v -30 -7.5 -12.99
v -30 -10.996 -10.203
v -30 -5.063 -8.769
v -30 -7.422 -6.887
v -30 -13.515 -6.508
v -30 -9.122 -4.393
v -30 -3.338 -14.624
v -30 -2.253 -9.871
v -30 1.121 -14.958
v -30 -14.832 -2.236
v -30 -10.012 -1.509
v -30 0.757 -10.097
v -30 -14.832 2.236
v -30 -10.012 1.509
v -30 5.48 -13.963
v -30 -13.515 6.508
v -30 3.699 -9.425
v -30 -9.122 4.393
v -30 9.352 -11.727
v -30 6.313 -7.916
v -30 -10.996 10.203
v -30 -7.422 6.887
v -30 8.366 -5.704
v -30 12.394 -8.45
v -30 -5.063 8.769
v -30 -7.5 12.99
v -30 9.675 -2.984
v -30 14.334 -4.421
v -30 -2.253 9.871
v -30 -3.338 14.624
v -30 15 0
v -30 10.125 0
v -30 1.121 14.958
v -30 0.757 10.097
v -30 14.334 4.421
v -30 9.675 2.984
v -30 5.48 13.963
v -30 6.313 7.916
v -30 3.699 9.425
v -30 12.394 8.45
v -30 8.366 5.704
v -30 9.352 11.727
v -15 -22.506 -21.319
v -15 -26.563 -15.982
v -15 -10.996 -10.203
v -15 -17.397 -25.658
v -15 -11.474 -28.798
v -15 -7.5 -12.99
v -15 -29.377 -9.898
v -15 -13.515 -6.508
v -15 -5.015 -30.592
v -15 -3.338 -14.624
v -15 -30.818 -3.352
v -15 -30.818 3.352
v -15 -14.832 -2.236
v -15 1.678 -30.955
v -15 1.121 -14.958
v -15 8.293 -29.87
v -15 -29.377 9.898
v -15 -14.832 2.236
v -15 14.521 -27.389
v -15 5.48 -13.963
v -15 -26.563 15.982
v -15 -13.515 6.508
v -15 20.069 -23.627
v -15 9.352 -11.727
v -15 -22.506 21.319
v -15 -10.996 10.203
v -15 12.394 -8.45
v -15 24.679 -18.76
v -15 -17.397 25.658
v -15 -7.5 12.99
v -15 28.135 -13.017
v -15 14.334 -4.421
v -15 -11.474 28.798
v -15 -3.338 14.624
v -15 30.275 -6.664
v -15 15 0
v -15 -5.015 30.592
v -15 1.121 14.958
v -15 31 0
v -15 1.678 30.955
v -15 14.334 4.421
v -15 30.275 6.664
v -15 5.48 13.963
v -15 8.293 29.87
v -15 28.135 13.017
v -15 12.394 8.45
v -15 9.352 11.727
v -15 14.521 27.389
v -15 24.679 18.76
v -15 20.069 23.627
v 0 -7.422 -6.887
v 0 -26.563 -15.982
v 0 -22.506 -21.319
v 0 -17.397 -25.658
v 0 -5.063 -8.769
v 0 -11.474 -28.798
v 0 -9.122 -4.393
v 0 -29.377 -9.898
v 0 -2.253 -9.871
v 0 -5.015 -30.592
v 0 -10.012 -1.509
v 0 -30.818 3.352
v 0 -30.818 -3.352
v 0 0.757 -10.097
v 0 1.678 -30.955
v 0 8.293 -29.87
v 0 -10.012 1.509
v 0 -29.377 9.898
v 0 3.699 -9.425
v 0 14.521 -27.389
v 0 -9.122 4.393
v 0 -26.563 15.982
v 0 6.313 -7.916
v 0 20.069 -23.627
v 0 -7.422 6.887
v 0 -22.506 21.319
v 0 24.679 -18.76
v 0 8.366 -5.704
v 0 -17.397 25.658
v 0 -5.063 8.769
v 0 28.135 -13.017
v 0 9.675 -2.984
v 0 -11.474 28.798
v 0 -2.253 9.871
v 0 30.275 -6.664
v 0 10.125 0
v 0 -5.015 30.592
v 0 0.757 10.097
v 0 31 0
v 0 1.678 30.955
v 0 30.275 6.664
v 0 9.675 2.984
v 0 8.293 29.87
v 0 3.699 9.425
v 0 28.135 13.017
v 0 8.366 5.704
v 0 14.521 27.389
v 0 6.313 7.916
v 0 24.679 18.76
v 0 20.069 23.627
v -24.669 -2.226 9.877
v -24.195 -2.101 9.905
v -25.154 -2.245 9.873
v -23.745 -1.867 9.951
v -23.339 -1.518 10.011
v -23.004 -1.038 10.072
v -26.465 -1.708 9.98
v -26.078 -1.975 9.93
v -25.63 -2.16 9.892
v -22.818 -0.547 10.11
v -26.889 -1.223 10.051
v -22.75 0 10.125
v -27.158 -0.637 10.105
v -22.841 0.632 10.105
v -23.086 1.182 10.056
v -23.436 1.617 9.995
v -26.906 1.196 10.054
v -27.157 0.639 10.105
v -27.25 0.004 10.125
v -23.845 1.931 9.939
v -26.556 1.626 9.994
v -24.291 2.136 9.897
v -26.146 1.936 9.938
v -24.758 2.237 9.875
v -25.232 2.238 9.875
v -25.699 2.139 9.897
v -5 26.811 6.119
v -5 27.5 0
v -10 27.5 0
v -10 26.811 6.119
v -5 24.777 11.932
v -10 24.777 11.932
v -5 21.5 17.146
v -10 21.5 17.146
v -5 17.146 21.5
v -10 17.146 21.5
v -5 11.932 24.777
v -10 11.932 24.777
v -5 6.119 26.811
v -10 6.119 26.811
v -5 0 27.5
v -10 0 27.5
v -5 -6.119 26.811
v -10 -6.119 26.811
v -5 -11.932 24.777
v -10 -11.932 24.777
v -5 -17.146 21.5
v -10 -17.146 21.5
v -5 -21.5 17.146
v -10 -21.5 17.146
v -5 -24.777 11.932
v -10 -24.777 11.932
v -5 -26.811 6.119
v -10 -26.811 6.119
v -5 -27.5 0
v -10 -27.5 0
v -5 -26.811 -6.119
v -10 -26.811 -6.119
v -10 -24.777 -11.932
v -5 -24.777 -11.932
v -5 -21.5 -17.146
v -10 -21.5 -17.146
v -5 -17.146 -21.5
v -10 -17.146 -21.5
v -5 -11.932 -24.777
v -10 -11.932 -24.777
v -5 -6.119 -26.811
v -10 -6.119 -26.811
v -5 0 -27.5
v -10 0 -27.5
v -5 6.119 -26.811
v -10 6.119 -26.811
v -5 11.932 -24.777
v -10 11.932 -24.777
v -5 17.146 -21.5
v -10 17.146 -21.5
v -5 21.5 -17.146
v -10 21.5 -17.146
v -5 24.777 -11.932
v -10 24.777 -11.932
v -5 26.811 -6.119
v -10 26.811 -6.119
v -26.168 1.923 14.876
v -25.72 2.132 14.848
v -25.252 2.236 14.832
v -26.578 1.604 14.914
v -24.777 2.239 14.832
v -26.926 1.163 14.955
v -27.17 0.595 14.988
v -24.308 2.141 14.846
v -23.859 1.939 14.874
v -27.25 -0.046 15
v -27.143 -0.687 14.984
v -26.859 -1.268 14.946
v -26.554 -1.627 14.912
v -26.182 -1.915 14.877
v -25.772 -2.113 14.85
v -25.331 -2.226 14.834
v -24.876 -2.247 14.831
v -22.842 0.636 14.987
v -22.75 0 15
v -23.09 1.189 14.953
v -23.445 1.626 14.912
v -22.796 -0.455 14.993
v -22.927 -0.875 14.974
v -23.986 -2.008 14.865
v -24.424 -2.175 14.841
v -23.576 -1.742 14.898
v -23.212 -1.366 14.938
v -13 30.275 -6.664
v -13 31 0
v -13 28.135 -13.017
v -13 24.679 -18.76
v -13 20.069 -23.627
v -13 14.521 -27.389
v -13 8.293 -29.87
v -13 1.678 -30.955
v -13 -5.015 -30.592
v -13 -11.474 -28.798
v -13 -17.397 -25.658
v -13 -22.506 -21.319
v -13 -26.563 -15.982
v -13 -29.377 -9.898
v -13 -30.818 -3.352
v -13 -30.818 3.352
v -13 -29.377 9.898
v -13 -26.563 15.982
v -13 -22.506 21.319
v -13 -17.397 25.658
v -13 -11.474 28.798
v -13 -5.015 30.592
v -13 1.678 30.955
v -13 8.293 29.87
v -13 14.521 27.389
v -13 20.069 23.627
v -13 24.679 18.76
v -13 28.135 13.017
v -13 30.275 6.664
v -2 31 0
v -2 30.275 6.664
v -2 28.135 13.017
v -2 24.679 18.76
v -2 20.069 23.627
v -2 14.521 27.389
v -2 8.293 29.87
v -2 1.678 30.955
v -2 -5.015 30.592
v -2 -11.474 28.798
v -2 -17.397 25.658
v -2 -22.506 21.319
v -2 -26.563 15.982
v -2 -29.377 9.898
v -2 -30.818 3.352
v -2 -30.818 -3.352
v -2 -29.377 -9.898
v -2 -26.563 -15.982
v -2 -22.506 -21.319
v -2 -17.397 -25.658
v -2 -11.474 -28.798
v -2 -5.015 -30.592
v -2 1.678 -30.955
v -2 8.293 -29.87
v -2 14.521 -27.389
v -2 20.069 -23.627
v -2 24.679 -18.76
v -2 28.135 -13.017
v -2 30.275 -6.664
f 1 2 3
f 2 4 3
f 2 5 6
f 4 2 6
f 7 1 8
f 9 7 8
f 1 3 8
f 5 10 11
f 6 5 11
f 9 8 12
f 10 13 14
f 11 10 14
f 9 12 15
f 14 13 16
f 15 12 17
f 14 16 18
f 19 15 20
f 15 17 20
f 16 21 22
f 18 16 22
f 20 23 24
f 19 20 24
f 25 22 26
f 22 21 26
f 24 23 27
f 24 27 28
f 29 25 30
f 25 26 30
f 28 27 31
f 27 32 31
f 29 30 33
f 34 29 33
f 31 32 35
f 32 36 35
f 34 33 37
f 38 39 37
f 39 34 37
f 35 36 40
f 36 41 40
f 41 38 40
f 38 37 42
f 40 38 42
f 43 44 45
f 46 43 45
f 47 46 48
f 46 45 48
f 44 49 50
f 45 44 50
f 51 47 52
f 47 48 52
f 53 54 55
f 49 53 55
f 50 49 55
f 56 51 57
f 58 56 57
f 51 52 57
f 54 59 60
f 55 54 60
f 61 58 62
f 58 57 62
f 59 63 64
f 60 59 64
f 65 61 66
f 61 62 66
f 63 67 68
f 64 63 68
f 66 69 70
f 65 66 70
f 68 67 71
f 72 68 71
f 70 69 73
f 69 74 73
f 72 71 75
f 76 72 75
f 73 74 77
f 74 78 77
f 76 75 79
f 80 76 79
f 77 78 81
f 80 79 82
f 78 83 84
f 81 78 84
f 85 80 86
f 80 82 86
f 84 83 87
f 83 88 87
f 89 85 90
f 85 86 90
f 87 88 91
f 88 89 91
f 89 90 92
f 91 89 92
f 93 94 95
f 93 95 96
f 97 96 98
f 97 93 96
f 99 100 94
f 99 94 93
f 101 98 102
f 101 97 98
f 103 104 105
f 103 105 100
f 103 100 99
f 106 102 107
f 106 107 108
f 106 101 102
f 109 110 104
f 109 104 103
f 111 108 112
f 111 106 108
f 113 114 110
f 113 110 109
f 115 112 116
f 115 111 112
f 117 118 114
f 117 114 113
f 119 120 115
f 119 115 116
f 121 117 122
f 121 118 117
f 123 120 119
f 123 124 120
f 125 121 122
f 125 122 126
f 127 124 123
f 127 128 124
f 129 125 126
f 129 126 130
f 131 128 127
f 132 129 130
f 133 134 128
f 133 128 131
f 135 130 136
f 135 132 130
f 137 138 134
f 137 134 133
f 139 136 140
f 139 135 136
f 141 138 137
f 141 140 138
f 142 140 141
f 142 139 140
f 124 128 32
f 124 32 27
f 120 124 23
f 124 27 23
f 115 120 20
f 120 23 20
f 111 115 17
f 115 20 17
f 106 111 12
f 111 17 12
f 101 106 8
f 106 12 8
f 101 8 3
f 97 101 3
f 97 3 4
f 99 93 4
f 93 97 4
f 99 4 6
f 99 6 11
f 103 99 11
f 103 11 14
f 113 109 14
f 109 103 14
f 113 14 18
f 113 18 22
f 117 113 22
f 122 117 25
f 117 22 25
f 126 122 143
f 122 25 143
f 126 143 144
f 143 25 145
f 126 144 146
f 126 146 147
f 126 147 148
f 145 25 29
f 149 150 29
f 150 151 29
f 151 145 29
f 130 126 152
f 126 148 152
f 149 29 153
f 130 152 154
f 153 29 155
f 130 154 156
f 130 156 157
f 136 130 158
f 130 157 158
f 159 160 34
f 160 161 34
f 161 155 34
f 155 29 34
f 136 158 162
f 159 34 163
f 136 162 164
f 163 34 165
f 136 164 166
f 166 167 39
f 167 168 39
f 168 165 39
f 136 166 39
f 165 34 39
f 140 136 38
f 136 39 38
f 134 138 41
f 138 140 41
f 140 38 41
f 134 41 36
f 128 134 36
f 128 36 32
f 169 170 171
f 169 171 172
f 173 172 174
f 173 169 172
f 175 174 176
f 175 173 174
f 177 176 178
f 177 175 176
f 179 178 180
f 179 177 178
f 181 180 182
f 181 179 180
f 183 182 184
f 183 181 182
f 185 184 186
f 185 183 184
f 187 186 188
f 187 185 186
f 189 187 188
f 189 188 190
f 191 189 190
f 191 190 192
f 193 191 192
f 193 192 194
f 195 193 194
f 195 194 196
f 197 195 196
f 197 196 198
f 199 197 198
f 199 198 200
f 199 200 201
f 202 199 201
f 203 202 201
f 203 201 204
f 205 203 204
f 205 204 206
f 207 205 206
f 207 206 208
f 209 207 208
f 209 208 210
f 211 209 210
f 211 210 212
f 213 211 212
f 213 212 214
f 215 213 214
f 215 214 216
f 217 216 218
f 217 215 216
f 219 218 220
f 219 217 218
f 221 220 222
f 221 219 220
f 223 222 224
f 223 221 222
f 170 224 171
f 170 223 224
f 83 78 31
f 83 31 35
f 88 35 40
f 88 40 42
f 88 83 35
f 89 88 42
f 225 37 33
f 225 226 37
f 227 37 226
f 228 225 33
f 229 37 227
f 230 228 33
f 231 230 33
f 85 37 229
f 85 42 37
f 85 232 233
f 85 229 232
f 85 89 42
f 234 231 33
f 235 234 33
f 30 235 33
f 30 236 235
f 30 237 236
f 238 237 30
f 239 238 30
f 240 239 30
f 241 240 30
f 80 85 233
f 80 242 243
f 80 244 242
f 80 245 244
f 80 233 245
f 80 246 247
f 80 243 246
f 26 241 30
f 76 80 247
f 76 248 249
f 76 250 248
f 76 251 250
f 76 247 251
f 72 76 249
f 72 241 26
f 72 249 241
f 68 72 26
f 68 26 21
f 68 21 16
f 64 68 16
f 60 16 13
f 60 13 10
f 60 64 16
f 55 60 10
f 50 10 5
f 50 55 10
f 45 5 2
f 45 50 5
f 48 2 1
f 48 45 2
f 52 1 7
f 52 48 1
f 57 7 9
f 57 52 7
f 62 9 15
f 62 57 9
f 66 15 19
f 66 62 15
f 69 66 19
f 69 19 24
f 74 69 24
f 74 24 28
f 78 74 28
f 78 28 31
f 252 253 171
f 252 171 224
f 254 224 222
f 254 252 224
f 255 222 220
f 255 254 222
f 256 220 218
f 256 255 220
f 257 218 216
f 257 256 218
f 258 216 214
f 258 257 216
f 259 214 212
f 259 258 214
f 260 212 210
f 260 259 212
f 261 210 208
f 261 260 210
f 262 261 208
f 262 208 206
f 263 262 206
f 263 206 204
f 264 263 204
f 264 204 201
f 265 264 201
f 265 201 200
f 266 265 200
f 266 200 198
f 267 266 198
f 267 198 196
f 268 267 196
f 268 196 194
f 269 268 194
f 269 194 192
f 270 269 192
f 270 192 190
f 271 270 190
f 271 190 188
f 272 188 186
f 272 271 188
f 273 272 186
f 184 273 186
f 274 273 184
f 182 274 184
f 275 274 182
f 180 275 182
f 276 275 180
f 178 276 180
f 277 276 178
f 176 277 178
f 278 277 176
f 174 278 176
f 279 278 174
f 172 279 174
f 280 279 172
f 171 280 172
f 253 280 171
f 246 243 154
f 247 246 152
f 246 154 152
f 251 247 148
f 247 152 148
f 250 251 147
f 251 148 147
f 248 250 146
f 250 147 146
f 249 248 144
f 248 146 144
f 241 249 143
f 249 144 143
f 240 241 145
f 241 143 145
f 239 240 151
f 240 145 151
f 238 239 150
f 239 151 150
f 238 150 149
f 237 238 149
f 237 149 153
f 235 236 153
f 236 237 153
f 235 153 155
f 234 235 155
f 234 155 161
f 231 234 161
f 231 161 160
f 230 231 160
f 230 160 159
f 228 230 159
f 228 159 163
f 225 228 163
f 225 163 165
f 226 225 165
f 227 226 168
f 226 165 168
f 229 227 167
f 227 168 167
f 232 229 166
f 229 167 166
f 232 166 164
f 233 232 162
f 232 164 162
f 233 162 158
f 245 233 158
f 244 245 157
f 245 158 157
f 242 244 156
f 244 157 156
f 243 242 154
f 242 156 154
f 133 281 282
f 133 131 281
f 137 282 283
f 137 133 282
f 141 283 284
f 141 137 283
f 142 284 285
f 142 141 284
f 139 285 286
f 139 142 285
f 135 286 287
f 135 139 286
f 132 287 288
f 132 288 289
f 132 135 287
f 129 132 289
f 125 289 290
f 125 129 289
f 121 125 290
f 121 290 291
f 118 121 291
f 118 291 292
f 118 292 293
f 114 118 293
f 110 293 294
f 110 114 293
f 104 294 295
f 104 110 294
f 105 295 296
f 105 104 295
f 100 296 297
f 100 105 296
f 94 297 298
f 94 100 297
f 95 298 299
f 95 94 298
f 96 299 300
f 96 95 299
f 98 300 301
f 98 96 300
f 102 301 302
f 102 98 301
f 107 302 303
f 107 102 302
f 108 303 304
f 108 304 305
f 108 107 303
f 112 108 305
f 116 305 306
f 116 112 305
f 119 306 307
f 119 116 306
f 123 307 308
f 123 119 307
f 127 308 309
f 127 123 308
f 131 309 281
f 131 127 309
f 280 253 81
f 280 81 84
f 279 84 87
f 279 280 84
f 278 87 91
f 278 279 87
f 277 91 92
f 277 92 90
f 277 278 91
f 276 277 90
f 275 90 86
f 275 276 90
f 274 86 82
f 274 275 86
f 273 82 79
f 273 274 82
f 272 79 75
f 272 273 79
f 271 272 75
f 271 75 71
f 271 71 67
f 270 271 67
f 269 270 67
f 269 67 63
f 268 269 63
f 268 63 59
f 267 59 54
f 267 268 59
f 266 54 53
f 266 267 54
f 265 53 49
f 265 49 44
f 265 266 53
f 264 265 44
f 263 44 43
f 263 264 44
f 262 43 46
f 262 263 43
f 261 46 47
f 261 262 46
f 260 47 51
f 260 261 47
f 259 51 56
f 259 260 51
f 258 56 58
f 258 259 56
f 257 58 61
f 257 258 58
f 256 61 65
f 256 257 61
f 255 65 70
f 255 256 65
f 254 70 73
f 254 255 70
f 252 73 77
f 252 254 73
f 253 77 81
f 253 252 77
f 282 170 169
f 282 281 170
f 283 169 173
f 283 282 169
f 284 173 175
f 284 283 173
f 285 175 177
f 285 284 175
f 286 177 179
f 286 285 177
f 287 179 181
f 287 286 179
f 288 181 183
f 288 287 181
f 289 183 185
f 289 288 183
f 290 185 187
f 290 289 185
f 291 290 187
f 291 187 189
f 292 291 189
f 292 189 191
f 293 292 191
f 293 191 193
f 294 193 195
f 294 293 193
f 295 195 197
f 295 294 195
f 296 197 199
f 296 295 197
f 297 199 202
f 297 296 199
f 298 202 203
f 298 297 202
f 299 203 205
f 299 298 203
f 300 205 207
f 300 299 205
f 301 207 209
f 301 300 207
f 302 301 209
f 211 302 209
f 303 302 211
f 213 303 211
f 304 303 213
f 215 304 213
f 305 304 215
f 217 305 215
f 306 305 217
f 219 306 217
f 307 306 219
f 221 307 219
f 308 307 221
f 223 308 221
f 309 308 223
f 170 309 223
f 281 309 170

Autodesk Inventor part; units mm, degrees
ref_plane "YZ Plane" through (0, 0, 0) normal (1, 0, 0) x (0, 1, 0)
ref_plane "XZ Plane" through (0, 0, 0) normal (0, 1, 0) x (-1, 0, 0)
ref_plane "XY Plane" through (0, 0, 0) normal (0, 0, 1) x (1, 0, 0)
sketch "Boceto1" plane through (0, 0, 0) normal (0, 0, 1) x (1, 0, 0)
  line L0 (-24.1261, 0) -> (26.0802, 0) construction
  line L1 (0, 10.125) -> (-30, 10.125)
  line L2 (-30, 10.125) -> (-30, 15)
  line L3 (-30, 15) -> (-15, 15)
  line L4 (-15, 15) -> (-15, 31)
  line L5 (0, 31) -> (0, 10.125)
  line L6 (-15, 31) -> (-13, 31)
  line L7 (-13, 31) -> (-10, 27.5)
  line L8 (-10, 27.5) -> (-5, 27.5)
  line L9 (-2, 31) -> (0, 31)
  line L10 (-2, 31) -> (-5, 27.5)
  line L11 (-7.5, 27.5) -> (-7.5, 0) construction
  point P0 (0, 0)
  point P1 (0, 20.5625)
  dimension "d0" = 27.5
  dimension "d1" = 31
  dimension "d2" = 10.125
  dimension "d3" = 15
  dimension "d4" = 15
  dimension "d5" = 2
  dimension "d6" = 2
  dimension "d7" = 5
  dimension "d8" = 7.5
  dimension "d9" = 15
revolve "Revolución1" add sketch "Boceto1" angle 360 about axis through (-24.1261, 0, 0) along (1, 0, 0)
sketch "Sketch2" plane through (0, 0, 0) normal (0, 0, 1) x (1, 0, 0)
  circle A0 centre (-25, 0) radius 2.25
  point P0 (0, 0)
  dimension "d11" = 4.5
  dimension "d12" = 25
extrude "Extrusion1" cut sketch "Sketch2" along normal blind 34.25
properties part number "PoleaBrazos"
